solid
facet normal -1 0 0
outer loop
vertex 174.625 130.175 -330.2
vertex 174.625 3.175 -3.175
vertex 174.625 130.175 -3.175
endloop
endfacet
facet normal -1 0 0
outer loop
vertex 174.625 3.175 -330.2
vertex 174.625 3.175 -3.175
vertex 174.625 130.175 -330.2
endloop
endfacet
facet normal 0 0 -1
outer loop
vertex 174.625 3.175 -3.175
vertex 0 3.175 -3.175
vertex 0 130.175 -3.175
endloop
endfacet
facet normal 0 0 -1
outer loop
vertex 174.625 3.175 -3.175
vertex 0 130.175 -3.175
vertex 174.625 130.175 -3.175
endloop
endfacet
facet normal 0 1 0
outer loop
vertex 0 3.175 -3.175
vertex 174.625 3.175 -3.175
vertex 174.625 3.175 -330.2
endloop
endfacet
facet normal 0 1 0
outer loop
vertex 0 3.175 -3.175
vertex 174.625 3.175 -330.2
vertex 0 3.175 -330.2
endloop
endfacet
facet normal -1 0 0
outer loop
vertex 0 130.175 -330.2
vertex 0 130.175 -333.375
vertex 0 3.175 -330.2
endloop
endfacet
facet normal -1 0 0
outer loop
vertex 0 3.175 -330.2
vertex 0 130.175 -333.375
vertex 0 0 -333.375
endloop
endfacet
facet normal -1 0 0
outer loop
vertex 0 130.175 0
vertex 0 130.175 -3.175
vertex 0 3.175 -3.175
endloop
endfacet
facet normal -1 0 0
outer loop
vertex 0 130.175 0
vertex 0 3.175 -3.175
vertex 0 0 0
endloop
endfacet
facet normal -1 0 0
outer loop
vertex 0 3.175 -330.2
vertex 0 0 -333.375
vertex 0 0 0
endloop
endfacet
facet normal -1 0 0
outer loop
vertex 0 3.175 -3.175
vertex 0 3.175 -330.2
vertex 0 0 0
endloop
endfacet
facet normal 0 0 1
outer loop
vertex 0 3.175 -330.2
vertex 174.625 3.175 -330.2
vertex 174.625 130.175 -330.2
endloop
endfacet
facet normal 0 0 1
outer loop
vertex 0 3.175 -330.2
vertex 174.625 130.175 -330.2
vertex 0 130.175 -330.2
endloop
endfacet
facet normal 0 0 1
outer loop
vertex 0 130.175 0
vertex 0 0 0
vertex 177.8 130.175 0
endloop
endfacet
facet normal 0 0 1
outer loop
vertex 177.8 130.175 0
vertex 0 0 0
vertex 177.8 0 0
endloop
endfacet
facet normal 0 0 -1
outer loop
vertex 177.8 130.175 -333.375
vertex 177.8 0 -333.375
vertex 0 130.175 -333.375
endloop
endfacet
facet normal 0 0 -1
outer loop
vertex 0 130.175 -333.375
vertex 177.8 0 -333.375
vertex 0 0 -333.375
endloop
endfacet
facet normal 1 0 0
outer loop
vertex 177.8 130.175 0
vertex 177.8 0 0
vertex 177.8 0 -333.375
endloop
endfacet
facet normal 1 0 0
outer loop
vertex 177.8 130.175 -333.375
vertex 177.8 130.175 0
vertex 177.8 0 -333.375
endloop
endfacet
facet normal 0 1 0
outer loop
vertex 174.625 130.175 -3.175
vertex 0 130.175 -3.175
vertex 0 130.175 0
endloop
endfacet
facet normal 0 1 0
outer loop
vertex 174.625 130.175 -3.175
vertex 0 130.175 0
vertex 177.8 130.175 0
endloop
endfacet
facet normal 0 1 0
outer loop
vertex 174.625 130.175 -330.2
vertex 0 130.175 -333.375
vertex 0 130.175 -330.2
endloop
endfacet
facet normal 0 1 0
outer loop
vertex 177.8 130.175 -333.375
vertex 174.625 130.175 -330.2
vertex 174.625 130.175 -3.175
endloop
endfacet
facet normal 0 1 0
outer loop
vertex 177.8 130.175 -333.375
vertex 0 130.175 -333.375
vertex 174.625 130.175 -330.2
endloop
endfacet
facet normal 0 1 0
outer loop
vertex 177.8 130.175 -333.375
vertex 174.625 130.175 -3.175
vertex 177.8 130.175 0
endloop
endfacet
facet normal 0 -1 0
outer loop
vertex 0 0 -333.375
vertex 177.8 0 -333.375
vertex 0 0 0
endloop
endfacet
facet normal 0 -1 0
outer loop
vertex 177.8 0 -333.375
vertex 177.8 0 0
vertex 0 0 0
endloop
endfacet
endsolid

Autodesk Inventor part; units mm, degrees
ref_plane "YZ Plane" through (0, 0, 0) normal (1, 0, 0) x (0, 1, 0)
ref_plane "XZ Plane" through (0, 0, 0) normal (0, 1, 0) x (-1, 0, 0)
ref_plane "XY Plane" through (0, 0, 0) normal (0, 0, 1) x (1, 0, 0)
sketch "Sketch1" plane through (0, 0, 0) normal (0, 1, 0) x (-1, 0, 0)
  line L0 (0, 0) -> (-177.8, 0)
  line L1 (-177.8, 0) -> (-177.8, -333.375)
  line L2 (-177.8, -333.375) -> (0, -333.375)
  line L3 (0, -333.375) -> (0, 0)
  dimension "d0" = 177.8
  dimension "d1" = 333.375
extrude "Extrusion1" add sketch "Sketch1" along normal blind 3.175
sketch "Sketch2" plane through (0, 3.175, 0) normal (0, 1, 0) x (1, 0, 0)
  line L0 (0, 333.375) -> (0, 0) construction
  line L1 (0, 3.175) -> (174.625, 3.175)
  line L2 (174.625, 3.175) -> (174.625, 330.2)
  line L3 (174.625, 330.2) -> (0, 330.2)
  line L4 (177.8, 333.375) -> (0, 333.375) projected
  line L5 (177.8, 0) -> (177.8, 333.375) projected
  line L6 (0, 0) -> (177.8, 0) projected
  line L7 (0, 0) -> (0, 3.175)
  line L8 (0, 330.2) -> (0, 333.375)
  dimension "d4" = 3.175
  dimension "d5" = 3.175
  dimension "d6" = 3.175
extrude "Extrusion2" add sketch "Sketch2" along normal blind 127
